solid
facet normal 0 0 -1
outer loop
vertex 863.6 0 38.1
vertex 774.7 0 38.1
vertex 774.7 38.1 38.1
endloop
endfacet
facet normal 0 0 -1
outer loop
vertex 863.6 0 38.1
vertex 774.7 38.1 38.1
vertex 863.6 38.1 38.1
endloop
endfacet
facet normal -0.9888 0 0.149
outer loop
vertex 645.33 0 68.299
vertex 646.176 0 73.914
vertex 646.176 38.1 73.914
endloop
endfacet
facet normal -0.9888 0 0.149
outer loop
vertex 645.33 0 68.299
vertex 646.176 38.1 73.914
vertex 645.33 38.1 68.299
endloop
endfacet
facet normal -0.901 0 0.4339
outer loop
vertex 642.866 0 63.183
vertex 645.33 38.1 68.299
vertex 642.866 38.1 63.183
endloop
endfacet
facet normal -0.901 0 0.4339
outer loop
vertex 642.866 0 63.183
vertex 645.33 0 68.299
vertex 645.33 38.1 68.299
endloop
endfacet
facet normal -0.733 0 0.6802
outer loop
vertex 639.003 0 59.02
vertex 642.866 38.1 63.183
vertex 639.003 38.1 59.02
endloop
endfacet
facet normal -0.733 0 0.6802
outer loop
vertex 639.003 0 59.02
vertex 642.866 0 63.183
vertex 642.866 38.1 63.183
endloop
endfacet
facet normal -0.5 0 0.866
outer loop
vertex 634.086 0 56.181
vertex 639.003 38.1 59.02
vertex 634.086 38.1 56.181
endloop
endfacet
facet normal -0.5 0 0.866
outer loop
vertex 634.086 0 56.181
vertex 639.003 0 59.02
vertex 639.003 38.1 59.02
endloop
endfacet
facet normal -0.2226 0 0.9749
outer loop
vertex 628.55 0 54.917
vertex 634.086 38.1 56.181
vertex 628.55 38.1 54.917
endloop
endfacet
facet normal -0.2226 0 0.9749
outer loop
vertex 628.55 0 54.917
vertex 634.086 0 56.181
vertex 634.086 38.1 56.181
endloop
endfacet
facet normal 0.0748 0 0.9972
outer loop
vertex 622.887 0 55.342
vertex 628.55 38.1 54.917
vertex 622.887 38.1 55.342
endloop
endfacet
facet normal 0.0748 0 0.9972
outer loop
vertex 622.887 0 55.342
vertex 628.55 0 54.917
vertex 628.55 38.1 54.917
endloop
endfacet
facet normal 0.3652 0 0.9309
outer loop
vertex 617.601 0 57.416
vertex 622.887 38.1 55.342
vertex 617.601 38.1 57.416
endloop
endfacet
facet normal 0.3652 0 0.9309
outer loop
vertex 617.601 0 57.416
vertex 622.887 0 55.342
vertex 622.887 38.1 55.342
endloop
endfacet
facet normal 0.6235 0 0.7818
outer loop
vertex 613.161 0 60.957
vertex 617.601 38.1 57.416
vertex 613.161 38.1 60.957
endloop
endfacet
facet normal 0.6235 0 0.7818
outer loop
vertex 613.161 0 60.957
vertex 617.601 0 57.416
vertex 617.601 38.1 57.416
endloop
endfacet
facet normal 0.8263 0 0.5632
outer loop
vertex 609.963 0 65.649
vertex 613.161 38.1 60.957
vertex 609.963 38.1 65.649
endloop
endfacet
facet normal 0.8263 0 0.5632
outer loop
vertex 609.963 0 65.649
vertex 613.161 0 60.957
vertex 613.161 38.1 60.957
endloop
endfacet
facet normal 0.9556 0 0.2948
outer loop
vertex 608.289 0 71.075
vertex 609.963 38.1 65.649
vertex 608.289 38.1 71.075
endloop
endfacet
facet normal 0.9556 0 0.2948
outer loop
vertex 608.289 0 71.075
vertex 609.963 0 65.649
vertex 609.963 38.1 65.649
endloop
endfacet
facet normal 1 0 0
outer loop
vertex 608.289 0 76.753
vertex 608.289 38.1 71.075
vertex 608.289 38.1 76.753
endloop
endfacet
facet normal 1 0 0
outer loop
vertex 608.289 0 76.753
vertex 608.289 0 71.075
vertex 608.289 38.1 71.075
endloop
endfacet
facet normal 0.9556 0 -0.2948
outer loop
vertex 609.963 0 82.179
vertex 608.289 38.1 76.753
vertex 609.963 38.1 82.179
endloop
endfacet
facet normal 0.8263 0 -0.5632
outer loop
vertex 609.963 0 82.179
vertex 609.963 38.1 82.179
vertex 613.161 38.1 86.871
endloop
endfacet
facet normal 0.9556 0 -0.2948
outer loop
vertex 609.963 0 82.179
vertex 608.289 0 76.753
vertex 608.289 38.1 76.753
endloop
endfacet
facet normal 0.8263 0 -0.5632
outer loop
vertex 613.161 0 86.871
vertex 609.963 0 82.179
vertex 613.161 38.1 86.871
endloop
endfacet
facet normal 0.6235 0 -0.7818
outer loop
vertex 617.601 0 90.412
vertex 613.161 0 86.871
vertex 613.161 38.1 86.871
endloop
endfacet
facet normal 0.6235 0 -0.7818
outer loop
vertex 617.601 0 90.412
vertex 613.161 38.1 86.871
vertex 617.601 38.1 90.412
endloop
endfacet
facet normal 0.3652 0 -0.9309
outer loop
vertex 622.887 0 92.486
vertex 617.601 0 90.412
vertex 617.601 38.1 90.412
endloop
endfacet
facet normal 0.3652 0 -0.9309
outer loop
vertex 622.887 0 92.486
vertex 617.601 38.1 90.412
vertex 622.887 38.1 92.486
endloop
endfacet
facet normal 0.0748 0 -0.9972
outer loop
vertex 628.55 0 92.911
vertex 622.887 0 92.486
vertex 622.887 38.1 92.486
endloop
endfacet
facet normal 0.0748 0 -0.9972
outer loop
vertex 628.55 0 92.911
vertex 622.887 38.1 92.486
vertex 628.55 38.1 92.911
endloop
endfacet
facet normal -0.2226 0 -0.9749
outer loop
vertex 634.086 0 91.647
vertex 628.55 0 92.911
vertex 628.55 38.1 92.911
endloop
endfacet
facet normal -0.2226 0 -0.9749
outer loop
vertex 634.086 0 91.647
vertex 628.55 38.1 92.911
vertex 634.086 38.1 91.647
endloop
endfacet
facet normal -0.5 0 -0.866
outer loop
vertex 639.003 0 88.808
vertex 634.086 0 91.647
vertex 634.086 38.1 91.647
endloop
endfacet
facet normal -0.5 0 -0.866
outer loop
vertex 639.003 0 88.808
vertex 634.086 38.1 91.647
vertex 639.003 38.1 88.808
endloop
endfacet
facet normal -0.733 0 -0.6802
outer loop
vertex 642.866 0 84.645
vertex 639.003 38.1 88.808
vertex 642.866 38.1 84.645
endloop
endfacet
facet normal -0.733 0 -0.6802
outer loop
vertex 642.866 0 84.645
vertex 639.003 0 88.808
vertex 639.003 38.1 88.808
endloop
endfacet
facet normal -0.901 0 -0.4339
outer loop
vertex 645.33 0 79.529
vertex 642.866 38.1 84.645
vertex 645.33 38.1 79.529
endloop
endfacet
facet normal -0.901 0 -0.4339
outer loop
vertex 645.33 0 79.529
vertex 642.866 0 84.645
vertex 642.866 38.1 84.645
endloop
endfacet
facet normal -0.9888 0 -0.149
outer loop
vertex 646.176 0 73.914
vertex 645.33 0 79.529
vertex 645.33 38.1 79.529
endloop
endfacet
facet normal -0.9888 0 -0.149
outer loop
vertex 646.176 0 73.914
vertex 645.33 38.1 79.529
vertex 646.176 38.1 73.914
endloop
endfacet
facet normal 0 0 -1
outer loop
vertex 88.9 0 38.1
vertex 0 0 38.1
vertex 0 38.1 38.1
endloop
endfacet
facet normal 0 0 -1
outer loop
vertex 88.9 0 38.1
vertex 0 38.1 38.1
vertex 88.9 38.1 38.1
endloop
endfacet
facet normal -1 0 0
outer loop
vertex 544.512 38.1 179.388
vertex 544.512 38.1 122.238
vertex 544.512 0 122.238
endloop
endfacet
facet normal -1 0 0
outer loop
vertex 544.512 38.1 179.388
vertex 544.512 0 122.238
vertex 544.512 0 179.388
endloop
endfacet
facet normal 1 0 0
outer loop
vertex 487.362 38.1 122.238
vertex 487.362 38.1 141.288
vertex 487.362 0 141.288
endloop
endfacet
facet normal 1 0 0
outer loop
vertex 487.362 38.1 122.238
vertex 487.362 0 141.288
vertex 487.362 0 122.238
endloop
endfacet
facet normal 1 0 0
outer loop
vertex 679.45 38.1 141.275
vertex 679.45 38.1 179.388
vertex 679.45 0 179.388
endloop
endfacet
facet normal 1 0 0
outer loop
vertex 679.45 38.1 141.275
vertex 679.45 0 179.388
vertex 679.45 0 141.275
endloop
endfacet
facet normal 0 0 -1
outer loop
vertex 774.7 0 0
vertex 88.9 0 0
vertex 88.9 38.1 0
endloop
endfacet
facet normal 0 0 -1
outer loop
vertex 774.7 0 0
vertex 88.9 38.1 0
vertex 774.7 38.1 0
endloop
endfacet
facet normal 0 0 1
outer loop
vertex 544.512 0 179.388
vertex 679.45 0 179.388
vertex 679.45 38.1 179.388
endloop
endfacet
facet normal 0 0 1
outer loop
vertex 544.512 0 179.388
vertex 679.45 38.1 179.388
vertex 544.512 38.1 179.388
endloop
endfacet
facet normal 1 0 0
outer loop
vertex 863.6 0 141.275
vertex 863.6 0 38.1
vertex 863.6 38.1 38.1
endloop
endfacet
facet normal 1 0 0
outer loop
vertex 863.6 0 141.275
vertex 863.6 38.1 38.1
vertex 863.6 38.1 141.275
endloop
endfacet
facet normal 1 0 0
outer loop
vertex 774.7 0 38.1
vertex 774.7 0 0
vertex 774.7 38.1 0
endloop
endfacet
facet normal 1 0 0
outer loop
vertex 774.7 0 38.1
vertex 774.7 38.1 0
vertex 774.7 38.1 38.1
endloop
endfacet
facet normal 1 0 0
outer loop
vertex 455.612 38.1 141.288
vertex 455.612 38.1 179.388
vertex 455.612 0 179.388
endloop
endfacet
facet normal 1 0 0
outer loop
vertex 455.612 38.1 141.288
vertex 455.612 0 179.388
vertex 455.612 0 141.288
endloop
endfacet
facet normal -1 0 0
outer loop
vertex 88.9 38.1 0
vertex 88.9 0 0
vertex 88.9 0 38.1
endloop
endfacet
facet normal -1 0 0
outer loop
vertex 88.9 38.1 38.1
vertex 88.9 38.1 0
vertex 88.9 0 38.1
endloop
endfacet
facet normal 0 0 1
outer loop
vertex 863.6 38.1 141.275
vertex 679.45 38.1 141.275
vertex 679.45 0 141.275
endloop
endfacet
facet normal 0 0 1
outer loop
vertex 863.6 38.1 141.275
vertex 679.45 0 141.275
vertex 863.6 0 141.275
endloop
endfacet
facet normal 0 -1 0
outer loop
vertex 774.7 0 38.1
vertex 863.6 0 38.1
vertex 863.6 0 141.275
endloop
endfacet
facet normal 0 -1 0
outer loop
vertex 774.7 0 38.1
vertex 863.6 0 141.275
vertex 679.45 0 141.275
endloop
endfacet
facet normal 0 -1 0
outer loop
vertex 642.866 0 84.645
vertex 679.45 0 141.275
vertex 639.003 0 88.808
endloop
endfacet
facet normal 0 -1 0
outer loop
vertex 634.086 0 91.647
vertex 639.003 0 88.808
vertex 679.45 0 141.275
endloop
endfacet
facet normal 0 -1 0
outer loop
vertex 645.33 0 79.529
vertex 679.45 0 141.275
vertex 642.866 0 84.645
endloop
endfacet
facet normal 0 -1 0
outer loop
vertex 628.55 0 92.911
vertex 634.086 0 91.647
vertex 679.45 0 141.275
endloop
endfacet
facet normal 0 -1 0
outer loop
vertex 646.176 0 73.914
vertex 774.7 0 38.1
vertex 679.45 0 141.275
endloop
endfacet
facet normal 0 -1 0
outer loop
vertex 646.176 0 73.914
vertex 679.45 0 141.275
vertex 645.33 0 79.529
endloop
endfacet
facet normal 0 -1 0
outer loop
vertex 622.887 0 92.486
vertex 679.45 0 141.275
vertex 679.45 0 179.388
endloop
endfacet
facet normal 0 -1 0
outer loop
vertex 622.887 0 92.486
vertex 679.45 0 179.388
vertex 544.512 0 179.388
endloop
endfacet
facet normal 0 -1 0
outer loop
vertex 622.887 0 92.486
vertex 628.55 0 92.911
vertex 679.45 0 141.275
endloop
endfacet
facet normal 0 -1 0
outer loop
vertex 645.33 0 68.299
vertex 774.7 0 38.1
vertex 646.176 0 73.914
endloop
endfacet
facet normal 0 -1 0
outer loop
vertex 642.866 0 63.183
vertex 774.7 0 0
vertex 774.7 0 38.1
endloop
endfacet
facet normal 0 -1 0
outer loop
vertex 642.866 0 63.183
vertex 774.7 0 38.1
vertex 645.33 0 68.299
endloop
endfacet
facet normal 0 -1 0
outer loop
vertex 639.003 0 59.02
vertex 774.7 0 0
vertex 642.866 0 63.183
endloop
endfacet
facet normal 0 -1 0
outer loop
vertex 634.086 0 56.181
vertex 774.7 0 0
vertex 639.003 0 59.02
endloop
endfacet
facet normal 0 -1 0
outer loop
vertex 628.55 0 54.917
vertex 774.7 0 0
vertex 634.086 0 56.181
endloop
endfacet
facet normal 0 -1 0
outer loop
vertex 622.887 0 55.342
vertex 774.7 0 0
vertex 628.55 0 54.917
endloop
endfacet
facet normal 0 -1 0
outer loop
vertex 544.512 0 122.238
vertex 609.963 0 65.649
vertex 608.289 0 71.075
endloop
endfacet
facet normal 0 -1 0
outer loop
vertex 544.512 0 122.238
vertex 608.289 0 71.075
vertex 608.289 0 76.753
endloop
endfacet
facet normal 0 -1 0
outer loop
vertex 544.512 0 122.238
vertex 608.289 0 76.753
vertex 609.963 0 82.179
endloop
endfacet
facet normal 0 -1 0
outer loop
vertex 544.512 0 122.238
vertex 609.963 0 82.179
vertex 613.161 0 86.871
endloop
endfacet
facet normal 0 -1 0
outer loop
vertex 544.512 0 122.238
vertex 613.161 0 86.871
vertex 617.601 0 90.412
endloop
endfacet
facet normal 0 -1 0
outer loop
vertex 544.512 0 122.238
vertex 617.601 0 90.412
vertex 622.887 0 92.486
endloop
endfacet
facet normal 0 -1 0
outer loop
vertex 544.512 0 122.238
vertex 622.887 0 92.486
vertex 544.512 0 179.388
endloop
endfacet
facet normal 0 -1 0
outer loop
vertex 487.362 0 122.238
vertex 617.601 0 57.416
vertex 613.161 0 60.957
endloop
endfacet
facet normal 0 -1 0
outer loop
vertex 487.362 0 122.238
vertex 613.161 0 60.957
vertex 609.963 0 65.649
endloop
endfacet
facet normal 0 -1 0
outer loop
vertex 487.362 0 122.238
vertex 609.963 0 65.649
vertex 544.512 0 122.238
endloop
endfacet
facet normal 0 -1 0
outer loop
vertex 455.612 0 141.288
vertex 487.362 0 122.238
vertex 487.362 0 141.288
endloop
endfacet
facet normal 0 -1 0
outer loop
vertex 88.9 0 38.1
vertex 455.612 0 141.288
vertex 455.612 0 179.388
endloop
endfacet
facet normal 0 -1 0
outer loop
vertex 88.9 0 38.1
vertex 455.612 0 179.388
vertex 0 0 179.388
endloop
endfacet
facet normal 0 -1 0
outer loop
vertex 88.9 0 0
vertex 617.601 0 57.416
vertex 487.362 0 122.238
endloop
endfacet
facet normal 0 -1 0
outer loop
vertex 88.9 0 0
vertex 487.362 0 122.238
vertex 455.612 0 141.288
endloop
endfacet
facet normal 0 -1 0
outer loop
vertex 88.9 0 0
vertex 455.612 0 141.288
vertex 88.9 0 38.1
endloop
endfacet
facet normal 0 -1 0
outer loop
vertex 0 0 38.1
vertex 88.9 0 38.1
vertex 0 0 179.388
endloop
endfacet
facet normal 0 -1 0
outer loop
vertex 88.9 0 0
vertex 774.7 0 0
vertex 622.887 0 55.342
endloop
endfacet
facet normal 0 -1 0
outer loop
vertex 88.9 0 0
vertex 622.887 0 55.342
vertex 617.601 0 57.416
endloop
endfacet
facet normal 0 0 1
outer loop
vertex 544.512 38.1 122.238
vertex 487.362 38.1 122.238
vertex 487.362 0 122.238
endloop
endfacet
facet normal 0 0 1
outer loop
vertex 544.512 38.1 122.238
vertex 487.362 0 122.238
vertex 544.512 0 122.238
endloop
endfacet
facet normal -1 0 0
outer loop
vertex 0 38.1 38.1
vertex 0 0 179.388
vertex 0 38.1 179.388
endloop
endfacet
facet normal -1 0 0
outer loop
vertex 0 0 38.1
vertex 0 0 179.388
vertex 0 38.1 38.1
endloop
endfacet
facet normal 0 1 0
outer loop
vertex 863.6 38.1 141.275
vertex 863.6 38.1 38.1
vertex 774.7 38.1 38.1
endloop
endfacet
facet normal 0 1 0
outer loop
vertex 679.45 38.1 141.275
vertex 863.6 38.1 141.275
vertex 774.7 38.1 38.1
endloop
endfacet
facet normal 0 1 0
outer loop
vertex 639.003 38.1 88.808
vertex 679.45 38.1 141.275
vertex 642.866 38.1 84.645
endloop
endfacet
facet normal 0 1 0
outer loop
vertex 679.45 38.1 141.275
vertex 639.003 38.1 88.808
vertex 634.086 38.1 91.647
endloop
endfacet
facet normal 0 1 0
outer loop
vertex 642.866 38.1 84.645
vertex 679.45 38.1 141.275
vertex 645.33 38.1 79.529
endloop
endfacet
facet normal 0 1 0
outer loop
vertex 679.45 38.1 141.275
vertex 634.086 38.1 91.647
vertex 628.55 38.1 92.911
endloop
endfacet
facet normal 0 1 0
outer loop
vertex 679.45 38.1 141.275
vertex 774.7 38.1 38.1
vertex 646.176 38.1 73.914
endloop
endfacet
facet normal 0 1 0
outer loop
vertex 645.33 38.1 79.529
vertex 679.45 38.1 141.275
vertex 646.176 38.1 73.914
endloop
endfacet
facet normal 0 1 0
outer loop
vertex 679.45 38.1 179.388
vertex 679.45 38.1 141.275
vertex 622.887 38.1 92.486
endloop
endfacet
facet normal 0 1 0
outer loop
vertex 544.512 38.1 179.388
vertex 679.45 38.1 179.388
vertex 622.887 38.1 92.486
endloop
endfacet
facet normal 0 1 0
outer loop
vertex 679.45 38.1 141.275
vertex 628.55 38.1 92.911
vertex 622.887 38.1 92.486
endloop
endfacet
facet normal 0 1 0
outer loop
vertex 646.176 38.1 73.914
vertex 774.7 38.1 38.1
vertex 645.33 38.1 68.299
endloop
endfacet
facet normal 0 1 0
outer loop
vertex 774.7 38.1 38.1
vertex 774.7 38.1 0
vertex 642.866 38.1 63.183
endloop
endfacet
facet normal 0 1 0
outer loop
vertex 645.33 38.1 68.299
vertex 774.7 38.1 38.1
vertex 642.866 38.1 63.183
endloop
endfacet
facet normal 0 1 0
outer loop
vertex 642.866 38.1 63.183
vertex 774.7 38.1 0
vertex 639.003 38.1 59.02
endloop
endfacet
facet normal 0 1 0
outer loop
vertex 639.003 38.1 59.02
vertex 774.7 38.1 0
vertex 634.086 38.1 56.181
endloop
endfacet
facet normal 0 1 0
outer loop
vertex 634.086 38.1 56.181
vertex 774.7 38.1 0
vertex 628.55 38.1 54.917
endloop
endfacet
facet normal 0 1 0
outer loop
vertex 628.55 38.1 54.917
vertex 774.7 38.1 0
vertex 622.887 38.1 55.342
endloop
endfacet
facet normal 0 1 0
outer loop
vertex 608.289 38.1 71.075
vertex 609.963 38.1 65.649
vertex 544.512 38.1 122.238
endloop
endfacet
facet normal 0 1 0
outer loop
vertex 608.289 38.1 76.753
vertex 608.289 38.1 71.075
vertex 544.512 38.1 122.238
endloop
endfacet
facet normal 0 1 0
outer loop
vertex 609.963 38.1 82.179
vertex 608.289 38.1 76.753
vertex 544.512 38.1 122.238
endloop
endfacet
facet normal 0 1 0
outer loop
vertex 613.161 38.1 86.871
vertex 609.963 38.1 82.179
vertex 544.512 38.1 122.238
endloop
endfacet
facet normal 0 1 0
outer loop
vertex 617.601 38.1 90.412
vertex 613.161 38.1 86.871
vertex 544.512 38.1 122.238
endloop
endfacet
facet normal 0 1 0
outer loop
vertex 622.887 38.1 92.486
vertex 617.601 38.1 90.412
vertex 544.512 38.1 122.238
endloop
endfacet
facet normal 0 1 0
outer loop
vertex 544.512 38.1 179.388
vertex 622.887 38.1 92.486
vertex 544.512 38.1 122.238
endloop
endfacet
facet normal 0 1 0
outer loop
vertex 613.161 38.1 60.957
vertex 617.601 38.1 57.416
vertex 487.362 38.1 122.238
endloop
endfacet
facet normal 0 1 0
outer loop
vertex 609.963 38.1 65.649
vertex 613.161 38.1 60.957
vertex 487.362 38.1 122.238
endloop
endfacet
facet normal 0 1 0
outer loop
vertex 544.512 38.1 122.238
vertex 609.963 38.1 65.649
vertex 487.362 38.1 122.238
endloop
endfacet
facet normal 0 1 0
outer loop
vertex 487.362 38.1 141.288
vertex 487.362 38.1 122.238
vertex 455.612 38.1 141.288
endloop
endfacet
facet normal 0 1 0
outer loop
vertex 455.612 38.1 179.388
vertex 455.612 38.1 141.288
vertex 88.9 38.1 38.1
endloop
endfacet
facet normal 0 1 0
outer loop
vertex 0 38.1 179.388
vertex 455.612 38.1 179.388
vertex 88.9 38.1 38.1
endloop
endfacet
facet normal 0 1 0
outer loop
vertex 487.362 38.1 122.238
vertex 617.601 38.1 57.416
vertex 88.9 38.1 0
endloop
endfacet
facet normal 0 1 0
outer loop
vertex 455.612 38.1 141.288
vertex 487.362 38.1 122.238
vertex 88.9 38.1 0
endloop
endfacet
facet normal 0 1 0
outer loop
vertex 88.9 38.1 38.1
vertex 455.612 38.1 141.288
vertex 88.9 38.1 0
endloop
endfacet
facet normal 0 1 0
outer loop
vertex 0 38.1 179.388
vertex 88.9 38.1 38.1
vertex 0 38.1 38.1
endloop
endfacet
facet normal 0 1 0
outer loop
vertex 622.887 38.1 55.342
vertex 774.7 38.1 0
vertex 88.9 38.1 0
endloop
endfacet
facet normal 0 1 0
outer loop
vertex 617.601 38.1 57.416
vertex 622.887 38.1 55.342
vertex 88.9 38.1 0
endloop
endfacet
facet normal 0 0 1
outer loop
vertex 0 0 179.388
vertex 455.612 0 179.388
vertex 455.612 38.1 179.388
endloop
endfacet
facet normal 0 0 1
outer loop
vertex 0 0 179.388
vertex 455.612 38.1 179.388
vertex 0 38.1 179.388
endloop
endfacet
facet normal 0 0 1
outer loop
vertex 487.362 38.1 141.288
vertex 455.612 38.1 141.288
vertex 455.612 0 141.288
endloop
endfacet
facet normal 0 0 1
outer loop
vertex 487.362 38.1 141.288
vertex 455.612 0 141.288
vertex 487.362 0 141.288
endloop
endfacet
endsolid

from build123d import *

# Parameters (mm, degrees)
SKETCH1_R           = 19.05
BOSS_EXTRUDE1_DEPTH = 38.1
CUT_EXTRUDE5_DEPTH  = 39.1
SKETCH8_W           = 184.15
SKETCH8_H           = 38.1127
CUT_EXTRUDE6_DEPTH  = 39.1
SKETCH9_W           = 88.9
SKETCH9_H           = 38.1
CUT_EXTRUDE7_DEPTH  = 39.1


with BuildPart() as part:
    # Sketch1 → Boss-Extrude1 (new body)
    with BuildSketch(Plane(origin=(0, 0, 0), x_dir=(1, 0, 0), z_dir=(0, 1, 0))):
        Polygon((0, 0), (774.7, 0), (774.7, -38.1), (863.6, -38.1), (863.6, -179.3875), (0, -179.3875), align=None)
        with Locations((627.126, -73.914)):
            Circle(SKETCH1_R, mode=Mode.SUBTRACT)
    extrude(amount=BOSS_EXTRUDE1_DEPTH)

    # Sketch7 → Cut-Extrude5 (cut, through all)
    with BuildSketch(Plane(origin=(0, 38.1, 0), x_dir=(1, 0, 0), z_dir=(0, 1, 0))):
        Polygon((455.6125, -141.2875), (487.3625, -141.2875), (487.3625, -122.2375), (544.5125, -122.2375), (544.5125, -179.3875), (455.6125, -179.3875), align=None)
    extrude(amount=-CUT_EXTRUDE5_DEPTH, mode=Mode.SUBTRACT)

    # Sketch8 → Cut-Extrude6 (cut, through all)
    with BuildSketch(Plane(origin=(0, 38.1, 0), x_dir=(1, 0, 0), z_dir=(0, 1, 0))):
        with Locations((771.525, -160.33115)):
            Rectangle(SKETCH8_W, SKETCH8_H)
    extrude(amount=-CUT_EXTRUDE6_DEPTH, mode=Mode.SUBTRACT)

    # Sketch9 → Cut-Extrude7 (cut, through all)
    with BuildSketch(Plane.XZ):
        with Locations((44.45, 19.05)):
            Rectangle(SKETCH9_W, SKETCH9_H)
    extrude(amount=-CUT_EXTRUDE7_DEPTH, mode=Mode.SUBTRACT)


solid = part.part
